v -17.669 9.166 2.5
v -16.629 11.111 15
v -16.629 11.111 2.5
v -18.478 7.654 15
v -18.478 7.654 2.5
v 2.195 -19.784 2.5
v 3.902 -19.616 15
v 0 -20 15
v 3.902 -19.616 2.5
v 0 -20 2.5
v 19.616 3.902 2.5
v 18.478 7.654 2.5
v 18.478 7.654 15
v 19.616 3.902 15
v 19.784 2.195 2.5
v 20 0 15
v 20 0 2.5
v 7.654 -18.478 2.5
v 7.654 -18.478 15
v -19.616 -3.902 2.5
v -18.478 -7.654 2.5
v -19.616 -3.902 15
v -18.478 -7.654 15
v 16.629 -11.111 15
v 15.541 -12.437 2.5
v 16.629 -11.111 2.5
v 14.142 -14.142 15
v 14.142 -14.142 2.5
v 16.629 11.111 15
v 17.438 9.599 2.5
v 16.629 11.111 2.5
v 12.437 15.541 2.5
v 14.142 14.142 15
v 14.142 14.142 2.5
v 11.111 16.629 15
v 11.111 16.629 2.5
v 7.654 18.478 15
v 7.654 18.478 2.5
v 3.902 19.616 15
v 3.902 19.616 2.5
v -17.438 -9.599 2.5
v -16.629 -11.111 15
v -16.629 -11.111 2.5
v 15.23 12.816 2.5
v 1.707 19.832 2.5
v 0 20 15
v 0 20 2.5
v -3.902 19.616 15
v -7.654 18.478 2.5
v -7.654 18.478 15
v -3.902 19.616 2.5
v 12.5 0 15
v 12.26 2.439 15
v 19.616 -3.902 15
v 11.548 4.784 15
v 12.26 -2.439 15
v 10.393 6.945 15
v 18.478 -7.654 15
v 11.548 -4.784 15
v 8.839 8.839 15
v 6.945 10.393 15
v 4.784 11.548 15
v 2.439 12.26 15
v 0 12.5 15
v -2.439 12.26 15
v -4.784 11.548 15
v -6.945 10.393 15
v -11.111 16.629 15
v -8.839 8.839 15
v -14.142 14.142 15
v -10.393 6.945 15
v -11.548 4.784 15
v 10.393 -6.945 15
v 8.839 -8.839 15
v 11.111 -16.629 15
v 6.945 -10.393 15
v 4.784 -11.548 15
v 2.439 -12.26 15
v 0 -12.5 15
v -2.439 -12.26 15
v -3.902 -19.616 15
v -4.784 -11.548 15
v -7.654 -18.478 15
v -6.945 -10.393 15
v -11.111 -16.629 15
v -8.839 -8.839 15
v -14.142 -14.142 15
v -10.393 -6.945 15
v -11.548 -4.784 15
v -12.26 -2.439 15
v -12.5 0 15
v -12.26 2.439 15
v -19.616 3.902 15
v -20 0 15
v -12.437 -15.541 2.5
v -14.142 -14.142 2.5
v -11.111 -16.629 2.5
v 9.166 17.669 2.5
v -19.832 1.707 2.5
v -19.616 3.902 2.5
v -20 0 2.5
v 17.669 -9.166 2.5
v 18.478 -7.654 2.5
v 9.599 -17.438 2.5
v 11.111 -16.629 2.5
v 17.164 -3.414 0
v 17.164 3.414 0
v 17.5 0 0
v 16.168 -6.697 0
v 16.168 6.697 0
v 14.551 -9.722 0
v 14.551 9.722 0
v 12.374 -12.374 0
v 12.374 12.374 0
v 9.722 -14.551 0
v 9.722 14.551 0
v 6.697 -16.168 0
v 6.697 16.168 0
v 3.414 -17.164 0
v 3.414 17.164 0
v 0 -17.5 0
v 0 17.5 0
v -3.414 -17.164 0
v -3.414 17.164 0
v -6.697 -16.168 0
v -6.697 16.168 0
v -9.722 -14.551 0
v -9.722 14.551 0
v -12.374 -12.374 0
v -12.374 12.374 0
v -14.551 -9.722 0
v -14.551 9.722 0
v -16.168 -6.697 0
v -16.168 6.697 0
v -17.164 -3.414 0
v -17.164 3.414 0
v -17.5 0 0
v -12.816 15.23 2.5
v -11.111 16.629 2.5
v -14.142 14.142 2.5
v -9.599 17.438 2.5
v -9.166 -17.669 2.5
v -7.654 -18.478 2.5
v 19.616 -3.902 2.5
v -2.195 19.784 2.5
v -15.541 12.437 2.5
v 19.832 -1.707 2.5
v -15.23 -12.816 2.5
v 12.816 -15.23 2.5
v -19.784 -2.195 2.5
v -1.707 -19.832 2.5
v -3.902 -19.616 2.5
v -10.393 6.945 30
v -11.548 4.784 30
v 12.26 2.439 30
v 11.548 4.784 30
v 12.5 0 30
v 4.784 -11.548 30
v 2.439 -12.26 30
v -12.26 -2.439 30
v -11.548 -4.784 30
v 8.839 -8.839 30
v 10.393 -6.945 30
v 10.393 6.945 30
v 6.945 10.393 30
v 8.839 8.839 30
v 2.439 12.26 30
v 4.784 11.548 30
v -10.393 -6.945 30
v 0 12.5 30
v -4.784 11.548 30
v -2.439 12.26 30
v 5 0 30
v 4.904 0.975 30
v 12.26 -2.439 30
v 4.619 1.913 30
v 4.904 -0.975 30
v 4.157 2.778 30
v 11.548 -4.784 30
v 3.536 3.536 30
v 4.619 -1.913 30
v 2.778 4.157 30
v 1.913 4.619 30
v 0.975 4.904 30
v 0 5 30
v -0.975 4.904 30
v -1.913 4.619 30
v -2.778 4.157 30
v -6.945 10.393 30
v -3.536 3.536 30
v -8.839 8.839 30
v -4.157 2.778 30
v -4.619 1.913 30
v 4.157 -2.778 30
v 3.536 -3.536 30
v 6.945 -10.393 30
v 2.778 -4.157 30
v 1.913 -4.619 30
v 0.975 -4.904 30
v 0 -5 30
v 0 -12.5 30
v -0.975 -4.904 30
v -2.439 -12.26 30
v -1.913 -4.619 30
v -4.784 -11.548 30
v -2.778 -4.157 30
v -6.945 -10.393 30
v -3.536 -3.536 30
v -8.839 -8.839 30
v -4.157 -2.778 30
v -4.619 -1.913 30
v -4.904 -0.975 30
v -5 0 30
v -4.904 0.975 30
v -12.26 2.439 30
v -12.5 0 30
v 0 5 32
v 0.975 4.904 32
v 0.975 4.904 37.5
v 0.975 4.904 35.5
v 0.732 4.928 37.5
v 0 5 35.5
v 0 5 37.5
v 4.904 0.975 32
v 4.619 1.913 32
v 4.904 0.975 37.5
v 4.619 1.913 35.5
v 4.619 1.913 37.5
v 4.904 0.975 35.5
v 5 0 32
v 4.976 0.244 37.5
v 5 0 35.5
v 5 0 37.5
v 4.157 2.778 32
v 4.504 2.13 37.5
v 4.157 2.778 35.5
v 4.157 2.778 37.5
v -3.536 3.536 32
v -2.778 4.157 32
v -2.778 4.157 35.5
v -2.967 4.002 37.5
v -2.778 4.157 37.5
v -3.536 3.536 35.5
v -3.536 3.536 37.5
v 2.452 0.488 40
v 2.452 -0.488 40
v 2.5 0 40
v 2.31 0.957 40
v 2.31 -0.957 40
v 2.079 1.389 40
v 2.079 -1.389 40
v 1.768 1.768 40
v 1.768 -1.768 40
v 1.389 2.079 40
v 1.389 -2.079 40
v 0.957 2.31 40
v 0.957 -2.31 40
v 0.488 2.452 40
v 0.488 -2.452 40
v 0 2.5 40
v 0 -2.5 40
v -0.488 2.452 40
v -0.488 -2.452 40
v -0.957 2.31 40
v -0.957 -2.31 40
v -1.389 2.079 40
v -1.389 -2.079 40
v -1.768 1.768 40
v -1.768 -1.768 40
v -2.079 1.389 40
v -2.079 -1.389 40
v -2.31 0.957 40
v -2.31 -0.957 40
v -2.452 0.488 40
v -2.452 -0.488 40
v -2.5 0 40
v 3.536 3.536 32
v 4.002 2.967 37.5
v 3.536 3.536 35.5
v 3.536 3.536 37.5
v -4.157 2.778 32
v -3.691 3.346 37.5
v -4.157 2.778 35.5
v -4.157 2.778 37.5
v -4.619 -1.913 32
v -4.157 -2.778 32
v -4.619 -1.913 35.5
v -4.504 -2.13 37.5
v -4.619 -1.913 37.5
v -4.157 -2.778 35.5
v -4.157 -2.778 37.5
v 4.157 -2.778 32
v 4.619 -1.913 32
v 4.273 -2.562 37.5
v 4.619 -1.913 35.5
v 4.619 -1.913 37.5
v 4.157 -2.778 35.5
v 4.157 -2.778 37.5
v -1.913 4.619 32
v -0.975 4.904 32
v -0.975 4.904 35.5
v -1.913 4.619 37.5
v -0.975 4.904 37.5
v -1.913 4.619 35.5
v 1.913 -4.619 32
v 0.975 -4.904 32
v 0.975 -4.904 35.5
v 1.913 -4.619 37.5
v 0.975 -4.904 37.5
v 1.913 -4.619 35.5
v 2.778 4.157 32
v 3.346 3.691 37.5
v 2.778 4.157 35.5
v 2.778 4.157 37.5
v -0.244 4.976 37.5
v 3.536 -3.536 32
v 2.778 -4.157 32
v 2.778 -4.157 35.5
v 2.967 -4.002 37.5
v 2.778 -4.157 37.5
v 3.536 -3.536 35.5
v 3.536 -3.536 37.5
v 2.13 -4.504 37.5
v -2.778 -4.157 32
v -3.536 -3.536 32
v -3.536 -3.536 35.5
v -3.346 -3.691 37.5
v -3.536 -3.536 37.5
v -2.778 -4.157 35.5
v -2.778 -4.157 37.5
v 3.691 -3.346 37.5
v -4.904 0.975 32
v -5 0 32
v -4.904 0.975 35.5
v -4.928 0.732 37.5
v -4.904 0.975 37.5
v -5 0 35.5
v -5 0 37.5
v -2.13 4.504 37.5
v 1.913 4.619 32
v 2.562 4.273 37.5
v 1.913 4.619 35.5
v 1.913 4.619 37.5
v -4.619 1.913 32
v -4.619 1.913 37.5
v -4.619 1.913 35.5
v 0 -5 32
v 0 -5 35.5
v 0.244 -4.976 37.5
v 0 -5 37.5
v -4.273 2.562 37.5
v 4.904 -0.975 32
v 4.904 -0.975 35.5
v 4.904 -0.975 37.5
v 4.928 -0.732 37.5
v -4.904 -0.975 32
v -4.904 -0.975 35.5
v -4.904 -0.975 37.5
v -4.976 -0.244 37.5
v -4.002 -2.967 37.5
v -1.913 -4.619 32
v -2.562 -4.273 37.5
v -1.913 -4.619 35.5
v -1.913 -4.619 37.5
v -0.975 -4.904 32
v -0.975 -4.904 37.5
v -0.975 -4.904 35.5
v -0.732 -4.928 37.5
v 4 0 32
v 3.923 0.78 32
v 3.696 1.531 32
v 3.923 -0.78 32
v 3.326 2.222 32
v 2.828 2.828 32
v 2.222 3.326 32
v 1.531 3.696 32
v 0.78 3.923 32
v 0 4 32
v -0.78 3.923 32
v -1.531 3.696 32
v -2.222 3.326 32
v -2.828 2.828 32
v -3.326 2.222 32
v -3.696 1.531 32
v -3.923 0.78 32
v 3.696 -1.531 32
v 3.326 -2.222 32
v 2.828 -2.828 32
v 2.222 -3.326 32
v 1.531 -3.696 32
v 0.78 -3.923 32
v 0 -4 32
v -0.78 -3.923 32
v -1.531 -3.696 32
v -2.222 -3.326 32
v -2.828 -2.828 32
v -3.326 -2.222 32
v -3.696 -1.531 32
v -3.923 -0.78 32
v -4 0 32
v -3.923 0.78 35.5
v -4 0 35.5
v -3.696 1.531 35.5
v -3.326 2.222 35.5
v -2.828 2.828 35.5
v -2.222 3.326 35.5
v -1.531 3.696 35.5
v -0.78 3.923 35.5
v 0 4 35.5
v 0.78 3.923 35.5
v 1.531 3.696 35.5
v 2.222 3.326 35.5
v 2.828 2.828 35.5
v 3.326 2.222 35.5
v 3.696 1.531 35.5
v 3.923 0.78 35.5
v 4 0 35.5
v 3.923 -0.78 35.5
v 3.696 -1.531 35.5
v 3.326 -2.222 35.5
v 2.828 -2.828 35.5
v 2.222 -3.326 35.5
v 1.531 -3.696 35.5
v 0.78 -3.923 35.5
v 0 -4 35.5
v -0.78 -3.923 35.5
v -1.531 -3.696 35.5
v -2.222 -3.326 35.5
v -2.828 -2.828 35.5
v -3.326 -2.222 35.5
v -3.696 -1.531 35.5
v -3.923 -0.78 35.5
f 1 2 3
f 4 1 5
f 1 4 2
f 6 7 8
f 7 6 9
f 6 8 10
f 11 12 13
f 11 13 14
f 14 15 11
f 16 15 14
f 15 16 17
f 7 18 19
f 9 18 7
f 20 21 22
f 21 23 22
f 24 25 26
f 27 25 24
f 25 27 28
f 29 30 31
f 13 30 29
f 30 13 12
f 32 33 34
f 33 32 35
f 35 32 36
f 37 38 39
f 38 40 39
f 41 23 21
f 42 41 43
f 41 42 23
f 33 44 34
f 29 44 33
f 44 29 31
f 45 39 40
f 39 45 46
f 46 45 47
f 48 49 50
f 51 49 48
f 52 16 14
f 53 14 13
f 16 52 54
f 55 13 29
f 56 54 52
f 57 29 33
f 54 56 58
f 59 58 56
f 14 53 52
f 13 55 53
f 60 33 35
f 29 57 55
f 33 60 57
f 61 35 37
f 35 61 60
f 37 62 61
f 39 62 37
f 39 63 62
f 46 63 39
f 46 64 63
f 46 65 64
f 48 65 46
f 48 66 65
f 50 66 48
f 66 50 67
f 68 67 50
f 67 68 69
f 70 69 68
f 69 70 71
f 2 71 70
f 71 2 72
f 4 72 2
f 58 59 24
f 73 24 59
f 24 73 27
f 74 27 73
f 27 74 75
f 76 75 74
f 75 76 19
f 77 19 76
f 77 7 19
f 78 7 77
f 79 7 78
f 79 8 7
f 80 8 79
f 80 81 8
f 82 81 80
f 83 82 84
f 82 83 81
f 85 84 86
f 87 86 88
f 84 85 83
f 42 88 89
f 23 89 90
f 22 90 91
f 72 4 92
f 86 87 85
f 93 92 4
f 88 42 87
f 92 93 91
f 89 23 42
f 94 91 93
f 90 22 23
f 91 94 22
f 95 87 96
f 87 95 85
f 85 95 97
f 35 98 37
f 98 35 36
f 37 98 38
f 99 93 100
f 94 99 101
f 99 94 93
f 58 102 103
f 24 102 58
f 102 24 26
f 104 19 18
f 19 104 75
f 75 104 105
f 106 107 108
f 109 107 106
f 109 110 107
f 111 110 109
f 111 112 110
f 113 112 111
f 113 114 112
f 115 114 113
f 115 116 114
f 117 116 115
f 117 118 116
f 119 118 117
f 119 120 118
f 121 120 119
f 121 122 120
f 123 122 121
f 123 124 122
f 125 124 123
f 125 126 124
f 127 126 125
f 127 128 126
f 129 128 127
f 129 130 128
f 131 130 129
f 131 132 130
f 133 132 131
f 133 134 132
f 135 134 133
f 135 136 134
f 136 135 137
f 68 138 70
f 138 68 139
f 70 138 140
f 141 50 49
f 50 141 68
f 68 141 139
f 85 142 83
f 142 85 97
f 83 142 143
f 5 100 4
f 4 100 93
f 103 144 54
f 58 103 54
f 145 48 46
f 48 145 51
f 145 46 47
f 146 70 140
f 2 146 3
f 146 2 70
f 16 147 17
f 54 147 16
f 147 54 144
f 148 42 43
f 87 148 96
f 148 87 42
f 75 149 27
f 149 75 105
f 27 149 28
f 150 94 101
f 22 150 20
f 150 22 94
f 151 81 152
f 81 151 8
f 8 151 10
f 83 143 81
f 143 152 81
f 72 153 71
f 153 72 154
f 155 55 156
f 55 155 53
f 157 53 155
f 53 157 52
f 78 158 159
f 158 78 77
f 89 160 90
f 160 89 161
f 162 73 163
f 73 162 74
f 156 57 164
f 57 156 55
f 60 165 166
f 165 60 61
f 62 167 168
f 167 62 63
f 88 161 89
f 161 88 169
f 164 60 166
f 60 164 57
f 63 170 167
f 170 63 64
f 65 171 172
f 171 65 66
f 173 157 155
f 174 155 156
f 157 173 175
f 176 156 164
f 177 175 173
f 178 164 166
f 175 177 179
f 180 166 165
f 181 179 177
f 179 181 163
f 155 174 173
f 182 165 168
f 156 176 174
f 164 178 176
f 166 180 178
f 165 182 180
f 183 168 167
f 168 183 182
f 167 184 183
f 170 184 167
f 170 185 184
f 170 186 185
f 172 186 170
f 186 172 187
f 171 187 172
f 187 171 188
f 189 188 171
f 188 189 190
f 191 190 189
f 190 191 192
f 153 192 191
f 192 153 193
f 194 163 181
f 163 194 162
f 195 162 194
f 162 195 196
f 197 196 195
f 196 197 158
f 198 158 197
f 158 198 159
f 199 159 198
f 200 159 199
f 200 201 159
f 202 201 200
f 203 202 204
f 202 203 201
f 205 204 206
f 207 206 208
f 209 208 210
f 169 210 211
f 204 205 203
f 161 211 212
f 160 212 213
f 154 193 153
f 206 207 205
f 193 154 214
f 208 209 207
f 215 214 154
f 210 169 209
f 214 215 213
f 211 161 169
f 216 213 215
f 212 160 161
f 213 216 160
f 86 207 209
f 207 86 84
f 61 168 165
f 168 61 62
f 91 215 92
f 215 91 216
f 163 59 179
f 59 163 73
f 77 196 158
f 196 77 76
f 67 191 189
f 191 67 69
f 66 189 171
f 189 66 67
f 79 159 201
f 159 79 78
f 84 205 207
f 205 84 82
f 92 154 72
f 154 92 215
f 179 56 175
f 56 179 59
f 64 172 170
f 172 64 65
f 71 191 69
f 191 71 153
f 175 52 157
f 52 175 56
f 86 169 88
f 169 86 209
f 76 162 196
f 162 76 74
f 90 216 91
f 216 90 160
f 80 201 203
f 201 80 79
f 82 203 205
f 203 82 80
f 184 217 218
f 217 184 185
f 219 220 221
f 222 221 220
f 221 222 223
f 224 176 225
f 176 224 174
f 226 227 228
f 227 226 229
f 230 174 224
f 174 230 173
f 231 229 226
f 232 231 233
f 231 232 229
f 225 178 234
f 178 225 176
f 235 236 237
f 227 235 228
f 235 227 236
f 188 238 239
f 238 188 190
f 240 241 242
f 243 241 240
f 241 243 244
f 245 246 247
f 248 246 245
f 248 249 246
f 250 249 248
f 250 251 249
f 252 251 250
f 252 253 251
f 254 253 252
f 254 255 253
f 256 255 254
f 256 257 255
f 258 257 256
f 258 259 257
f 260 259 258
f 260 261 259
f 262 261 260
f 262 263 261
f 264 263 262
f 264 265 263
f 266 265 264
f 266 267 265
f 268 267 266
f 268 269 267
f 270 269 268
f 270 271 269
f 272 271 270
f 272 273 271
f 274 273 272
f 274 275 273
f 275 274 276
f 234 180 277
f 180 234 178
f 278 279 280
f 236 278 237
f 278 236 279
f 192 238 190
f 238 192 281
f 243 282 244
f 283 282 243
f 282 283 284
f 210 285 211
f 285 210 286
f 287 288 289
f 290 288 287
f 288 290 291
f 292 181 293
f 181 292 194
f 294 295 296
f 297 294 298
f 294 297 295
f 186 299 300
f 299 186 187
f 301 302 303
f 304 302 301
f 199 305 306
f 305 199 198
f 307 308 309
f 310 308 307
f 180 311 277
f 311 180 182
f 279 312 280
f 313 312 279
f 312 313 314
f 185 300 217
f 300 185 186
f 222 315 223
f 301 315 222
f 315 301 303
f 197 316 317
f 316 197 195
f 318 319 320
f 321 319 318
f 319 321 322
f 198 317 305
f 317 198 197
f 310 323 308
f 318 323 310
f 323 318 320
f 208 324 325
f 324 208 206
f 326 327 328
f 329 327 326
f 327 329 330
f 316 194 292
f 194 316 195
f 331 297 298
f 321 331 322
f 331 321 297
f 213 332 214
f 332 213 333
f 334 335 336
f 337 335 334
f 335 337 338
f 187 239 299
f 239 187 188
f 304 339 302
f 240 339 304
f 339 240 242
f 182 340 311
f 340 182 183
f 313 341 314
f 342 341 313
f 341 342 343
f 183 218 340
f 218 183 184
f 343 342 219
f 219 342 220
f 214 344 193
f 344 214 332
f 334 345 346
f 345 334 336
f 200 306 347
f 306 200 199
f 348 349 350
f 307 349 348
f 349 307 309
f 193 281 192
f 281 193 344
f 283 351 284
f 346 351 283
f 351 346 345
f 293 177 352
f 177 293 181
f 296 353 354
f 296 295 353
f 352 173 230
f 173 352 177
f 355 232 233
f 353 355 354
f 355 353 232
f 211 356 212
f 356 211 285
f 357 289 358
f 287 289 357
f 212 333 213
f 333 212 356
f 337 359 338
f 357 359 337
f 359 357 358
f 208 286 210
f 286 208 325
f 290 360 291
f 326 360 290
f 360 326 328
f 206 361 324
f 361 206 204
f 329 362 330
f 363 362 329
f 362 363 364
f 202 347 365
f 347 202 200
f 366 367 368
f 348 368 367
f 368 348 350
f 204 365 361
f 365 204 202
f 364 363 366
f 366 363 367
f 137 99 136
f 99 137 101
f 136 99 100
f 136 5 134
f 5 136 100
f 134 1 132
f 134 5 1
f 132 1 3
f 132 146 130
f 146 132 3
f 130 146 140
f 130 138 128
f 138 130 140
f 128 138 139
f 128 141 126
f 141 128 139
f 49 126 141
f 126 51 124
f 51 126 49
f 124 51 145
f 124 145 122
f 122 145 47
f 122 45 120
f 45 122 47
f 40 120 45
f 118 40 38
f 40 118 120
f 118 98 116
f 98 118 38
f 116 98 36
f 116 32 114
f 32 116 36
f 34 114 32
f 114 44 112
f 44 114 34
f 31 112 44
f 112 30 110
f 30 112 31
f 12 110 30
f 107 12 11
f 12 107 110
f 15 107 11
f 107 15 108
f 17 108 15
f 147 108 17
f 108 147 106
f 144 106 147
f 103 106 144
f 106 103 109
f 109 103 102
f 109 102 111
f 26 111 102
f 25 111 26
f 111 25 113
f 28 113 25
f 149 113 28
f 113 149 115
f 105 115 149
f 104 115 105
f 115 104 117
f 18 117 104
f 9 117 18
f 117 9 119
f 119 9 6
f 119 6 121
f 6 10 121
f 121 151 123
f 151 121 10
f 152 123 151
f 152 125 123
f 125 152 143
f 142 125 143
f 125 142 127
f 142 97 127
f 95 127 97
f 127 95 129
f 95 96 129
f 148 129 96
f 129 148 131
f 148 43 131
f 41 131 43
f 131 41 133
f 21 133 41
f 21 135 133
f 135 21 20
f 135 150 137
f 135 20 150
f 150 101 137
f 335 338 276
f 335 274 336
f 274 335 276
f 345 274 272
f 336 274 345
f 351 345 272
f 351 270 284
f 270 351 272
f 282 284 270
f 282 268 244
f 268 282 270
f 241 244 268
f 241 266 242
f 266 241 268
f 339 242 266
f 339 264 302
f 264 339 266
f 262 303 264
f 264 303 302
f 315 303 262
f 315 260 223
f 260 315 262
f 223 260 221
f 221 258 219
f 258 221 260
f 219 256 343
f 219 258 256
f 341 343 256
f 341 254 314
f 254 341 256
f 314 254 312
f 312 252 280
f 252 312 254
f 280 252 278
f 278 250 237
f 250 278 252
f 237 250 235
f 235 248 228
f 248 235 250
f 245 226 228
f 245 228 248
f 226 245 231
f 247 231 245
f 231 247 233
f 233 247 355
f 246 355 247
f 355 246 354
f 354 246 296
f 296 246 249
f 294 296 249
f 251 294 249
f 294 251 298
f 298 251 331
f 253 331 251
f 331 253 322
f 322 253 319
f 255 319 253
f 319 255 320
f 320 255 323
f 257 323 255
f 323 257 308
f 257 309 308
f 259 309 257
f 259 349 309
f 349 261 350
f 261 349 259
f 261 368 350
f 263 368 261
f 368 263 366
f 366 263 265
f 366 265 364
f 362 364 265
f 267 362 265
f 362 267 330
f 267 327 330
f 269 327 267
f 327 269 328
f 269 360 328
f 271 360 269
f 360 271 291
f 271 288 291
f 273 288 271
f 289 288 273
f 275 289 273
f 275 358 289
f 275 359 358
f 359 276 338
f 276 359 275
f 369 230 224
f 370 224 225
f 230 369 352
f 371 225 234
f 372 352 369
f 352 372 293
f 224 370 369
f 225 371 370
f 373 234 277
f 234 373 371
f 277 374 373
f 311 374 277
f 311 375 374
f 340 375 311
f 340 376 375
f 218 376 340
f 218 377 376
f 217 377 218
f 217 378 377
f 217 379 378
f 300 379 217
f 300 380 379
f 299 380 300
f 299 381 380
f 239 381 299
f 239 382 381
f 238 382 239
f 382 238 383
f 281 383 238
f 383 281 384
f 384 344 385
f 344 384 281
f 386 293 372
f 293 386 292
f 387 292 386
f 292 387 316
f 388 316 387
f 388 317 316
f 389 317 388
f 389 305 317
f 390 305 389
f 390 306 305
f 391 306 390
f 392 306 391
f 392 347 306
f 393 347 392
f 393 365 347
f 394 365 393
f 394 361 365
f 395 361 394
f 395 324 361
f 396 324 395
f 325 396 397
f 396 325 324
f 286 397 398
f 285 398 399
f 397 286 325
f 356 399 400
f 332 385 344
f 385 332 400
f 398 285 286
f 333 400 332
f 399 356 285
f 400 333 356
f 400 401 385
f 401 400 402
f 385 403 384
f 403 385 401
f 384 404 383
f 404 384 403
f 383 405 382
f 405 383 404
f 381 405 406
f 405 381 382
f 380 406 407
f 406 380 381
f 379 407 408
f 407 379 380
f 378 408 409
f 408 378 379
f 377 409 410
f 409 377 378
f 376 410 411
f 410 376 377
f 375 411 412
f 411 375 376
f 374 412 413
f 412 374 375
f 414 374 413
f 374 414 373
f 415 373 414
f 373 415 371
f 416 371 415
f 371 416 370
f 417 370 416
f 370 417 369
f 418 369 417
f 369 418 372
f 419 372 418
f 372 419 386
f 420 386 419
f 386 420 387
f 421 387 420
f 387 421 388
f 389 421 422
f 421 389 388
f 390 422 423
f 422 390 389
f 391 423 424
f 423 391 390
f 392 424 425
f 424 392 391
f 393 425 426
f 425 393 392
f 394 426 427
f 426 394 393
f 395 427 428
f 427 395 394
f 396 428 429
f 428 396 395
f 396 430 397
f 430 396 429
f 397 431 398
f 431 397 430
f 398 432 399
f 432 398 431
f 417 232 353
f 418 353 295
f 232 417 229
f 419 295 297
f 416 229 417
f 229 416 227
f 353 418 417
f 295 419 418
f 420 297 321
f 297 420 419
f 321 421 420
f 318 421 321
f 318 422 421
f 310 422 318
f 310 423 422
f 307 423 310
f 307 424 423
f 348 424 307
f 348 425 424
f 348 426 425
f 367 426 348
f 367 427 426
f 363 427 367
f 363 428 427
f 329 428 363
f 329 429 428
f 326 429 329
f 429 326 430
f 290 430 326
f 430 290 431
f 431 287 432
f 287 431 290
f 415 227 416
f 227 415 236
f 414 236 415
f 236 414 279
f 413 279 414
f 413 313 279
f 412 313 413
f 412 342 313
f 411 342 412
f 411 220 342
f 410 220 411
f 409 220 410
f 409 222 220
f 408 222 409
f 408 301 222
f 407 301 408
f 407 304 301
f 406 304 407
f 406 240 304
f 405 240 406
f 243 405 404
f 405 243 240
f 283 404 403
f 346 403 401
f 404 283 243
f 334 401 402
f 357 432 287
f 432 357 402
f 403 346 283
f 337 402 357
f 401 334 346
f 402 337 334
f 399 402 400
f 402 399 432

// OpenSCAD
$fn = 32;

// ----------------------------------------------------------------------
// Stepped shaft: diameters 40, 25, 10 mm, 40 mm long
// ----------------------------------------------------------------------

// --- parameters (mm) ---
d1 = 40;                  // step 1 diameter
len1 = 15;                // step 1 length
d2 = 25;                  // step 2 diameter
len2 = 15;                // step 2 length
d3 = 10;                  // step 3 diameter
len3 = 10;                // step 3 length
total = 40;               // overall length
chamfer = 2.5;            // end chamfer
groove_r = 5;             // groove radius
groove_z = 32;            // groove position from the end
groove_w = 3.5;           // groove width
groove_d = 1;             // groove depth

difference() {
  /* turned body: stacked cylinders, every step sunk into the bigger one */
  union() {
    cylinder(h = len1, d = d1);
    translate([0, 0, 14.6]) cylinder(h = 15.4, d = d2);
    translate([0, 0, 29.6]) cylinder(h = 10.4, d = d3);
  }
  /* bottom chamfer ring cut */
  rotate_extrude() translate([17.5, -2.5]) polygon([[0, 0], [5, 0], [5, 7.5], [0, 2.5]]);
  /* top chamfer ring cut */
  rotate_extrude() translate([2.5, 40]) polygon([[0, 0], [5, -5], [5, 2.5], [0, 2.5]]);
  /* circlip groove just behind the shoulder */
  rotate_extrude() translate([groove_r - groove_d, groove_z]) square([groove_d + 2.5, groove_w]);
}
